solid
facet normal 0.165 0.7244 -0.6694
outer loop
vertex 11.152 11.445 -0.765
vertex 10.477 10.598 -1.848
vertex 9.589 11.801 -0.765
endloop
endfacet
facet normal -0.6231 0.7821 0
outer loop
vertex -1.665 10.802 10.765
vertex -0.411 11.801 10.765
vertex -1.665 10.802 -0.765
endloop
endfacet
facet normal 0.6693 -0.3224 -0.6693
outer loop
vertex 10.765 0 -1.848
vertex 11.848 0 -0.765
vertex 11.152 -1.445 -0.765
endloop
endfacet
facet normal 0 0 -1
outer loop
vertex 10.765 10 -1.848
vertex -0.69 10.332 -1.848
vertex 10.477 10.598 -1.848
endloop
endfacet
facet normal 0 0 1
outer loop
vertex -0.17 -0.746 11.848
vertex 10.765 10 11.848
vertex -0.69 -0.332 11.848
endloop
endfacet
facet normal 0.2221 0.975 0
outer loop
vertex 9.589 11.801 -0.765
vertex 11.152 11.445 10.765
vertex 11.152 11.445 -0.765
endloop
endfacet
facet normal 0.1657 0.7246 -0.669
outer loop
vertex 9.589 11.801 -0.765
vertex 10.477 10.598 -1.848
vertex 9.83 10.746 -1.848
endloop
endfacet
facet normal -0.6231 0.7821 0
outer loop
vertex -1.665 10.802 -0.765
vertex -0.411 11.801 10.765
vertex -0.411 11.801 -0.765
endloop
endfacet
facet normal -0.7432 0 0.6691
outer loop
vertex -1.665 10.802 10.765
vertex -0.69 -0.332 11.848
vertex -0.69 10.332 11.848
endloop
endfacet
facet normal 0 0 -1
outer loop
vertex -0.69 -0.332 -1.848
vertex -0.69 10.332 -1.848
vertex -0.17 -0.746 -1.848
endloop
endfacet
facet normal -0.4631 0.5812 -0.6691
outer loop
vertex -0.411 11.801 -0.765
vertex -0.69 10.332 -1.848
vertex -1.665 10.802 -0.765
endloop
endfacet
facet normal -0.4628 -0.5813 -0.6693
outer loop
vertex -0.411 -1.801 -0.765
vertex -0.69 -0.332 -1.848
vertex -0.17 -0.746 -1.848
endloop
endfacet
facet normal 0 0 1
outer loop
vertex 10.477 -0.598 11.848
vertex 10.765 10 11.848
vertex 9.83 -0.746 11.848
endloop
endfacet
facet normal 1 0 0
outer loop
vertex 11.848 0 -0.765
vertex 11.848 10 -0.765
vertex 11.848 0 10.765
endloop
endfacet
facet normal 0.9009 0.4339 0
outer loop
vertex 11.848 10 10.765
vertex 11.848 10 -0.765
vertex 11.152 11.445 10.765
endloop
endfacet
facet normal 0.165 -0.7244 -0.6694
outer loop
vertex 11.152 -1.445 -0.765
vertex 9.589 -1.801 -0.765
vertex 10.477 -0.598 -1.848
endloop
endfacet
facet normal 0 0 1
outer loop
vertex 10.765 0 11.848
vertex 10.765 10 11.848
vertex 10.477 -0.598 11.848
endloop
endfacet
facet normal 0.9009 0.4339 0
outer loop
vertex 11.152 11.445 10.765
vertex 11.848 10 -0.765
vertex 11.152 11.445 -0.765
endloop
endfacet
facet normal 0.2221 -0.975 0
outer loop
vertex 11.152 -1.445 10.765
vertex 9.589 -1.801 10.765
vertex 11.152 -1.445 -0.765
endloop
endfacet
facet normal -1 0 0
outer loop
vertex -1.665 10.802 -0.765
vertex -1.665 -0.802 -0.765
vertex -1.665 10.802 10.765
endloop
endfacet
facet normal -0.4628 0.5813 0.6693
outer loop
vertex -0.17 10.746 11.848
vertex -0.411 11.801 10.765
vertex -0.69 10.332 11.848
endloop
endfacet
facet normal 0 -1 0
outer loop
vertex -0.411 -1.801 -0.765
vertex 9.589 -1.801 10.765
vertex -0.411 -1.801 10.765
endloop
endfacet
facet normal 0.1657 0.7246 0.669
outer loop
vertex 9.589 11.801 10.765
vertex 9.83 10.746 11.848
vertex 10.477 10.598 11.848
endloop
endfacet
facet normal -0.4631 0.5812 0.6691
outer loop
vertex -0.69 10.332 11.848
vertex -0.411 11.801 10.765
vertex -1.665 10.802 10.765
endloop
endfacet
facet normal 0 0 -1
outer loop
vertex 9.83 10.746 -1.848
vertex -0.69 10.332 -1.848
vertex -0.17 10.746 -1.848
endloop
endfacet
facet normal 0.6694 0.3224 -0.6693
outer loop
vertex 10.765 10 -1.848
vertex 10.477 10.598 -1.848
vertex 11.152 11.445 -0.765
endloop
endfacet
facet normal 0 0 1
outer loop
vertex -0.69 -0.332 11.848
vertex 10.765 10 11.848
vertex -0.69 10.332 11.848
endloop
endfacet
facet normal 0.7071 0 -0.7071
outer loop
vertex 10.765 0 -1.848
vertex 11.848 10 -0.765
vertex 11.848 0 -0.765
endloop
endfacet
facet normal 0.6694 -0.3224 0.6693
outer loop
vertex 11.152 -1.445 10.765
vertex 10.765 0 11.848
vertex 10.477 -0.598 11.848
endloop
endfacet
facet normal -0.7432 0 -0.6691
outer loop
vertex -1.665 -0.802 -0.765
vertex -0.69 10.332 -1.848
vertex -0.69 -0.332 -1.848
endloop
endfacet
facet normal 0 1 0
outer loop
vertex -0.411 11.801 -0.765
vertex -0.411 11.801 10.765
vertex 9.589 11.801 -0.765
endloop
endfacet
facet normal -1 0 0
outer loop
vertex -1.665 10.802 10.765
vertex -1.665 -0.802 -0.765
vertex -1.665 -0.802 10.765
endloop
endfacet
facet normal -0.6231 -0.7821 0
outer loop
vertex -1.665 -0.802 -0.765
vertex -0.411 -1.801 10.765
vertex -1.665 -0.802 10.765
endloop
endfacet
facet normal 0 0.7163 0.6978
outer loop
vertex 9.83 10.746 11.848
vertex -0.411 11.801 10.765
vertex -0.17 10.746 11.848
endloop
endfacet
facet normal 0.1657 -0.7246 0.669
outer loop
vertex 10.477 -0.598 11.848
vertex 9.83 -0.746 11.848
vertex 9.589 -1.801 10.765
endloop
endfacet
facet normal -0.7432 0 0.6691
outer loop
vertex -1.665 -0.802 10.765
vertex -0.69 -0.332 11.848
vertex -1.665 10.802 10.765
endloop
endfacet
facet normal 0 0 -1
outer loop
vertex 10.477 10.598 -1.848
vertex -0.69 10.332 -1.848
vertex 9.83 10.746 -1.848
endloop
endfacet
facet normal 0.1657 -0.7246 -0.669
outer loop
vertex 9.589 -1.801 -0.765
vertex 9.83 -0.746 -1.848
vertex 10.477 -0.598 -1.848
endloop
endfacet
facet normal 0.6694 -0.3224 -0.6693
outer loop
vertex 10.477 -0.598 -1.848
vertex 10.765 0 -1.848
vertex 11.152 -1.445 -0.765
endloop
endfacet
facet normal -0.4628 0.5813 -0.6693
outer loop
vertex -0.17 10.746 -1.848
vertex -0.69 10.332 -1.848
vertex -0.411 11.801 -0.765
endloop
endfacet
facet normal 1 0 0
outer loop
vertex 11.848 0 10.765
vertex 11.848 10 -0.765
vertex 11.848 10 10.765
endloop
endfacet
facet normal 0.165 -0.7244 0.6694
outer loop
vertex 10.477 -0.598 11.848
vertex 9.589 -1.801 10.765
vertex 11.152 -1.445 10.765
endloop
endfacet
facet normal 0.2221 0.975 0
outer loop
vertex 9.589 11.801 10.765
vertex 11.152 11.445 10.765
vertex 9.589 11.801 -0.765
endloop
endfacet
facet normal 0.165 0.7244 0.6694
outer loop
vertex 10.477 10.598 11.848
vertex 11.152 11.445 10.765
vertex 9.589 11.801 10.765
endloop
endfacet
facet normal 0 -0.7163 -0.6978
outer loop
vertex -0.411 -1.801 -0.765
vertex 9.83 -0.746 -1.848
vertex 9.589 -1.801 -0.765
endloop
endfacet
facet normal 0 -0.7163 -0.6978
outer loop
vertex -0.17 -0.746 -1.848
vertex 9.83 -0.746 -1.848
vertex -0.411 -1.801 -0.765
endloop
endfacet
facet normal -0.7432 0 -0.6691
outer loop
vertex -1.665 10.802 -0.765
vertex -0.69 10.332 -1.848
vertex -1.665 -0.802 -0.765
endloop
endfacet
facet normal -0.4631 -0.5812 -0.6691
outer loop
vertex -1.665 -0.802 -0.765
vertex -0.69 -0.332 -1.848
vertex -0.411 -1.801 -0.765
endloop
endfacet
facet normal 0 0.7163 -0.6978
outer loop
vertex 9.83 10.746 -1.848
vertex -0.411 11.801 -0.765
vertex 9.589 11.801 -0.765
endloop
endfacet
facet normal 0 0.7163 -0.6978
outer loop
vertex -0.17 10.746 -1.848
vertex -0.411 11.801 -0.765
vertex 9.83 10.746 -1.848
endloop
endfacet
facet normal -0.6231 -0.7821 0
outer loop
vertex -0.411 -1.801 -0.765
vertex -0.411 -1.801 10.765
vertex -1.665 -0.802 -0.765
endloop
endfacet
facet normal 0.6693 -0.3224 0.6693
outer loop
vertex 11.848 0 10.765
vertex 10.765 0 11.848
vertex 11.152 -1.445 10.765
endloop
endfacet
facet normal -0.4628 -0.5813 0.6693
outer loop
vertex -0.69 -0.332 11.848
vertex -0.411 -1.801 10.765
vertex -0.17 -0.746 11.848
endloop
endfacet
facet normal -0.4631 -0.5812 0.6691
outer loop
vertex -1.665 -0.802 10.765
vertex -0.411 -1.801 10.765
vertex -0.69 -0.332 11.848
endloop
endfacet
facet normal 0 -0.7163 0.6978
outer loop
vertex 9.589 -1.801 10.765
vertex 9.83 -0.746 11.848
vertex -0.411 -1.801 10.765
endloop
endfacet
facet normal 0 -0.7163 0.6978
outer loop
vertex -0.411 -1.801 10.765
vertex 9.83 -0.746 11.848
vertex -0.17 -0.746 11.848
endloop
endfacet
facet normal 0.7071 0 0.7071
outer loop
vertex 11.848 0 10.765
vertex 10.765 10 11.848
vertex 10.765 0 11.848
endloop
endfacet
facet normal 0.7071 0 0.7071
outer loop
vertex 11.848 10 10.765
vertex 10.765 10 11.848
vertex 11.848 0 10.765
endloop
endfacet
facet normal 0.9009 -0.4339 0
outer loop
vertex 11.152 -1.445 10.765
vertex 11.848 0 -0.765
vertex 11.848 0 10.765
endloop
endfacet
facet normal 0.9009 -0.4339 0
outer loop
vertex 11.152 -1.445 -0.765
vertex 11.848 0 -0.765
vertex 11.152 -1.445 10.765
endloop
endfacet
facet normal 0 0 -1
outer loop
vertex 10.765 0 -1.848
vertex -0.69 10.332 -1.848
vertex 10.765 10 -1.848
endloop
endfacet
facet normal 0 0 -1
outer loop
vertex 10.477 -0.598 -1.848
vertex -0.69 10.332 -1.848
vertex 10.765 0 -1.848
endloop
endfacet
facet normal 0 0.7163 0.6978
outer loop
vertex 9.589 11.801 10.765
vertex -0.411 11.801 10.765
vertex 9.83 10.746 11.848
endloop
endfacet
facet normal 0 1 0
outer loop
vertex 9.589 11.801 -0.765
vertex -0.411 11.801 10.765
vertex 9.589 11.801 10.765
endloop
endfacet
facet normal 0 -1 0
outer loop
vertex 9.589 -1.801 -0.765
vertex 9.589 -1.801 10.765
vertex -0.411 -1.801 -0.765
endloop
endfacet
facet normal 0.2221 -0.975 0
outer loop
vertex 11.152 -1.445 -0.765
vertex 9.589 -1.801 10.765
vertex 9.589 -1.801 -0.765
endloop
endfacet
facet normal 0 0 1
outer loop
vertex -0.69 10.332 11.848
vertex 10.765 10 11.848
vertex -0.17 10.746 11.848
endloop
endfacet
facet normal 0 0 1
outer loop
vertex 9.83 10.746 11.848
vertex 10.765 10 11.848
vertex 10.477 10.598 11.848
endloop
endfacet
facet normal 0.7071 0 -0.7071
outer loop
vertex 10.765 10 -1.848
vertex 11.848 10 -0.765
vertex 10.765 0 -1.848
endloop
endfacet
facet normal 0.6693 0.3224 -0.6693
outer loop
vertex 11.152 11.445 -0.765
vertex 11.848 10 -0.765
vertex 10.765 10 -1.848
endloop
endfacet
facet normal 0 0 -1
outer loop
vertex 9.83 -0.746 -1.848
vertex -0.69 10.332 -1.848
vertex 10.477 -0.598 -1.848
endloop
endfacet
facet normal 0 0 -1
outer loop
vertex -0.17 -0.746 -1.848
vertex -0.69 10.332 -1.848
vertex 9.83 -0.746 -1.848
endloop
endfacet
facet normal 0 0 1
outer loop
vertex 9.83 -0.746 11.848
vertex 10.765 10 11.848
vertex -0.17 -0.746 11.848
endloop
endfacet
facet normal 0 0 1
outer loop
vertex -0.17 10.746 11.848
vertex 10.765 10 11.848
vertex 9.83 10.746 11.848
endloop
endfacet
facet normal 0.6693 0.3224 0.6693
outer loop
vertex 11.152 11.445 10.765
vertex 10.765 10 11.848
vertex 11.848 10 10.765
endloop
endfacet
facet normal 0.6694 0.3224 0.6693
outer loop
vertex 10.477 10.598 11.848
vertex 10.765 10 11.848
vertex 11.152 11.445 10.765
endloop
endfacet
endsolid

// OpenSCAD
// minkowski(): cube ⊕ sphere — the rounded box.
minkowski() {
    cube(10);
    sphere(2);
}
